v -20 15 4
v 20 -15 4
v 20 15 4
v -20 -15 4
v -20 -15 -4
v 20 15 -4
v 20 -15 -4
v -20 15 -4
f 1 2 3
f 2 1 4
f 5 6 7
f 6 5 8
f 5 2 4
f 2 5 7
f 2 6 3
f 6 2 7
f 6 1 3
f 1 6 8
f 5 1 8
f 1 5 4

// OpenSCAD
// Rectangular solid box with dimensions 40 mm × 30 mm × 8 mm
// Centered at origin (0,0,0)

difference() {
    // Main body of the box – a simple cuboid
    cube([40, 30, 8], center = true);   // [length, width, height] → [40, 30, 8]
}
